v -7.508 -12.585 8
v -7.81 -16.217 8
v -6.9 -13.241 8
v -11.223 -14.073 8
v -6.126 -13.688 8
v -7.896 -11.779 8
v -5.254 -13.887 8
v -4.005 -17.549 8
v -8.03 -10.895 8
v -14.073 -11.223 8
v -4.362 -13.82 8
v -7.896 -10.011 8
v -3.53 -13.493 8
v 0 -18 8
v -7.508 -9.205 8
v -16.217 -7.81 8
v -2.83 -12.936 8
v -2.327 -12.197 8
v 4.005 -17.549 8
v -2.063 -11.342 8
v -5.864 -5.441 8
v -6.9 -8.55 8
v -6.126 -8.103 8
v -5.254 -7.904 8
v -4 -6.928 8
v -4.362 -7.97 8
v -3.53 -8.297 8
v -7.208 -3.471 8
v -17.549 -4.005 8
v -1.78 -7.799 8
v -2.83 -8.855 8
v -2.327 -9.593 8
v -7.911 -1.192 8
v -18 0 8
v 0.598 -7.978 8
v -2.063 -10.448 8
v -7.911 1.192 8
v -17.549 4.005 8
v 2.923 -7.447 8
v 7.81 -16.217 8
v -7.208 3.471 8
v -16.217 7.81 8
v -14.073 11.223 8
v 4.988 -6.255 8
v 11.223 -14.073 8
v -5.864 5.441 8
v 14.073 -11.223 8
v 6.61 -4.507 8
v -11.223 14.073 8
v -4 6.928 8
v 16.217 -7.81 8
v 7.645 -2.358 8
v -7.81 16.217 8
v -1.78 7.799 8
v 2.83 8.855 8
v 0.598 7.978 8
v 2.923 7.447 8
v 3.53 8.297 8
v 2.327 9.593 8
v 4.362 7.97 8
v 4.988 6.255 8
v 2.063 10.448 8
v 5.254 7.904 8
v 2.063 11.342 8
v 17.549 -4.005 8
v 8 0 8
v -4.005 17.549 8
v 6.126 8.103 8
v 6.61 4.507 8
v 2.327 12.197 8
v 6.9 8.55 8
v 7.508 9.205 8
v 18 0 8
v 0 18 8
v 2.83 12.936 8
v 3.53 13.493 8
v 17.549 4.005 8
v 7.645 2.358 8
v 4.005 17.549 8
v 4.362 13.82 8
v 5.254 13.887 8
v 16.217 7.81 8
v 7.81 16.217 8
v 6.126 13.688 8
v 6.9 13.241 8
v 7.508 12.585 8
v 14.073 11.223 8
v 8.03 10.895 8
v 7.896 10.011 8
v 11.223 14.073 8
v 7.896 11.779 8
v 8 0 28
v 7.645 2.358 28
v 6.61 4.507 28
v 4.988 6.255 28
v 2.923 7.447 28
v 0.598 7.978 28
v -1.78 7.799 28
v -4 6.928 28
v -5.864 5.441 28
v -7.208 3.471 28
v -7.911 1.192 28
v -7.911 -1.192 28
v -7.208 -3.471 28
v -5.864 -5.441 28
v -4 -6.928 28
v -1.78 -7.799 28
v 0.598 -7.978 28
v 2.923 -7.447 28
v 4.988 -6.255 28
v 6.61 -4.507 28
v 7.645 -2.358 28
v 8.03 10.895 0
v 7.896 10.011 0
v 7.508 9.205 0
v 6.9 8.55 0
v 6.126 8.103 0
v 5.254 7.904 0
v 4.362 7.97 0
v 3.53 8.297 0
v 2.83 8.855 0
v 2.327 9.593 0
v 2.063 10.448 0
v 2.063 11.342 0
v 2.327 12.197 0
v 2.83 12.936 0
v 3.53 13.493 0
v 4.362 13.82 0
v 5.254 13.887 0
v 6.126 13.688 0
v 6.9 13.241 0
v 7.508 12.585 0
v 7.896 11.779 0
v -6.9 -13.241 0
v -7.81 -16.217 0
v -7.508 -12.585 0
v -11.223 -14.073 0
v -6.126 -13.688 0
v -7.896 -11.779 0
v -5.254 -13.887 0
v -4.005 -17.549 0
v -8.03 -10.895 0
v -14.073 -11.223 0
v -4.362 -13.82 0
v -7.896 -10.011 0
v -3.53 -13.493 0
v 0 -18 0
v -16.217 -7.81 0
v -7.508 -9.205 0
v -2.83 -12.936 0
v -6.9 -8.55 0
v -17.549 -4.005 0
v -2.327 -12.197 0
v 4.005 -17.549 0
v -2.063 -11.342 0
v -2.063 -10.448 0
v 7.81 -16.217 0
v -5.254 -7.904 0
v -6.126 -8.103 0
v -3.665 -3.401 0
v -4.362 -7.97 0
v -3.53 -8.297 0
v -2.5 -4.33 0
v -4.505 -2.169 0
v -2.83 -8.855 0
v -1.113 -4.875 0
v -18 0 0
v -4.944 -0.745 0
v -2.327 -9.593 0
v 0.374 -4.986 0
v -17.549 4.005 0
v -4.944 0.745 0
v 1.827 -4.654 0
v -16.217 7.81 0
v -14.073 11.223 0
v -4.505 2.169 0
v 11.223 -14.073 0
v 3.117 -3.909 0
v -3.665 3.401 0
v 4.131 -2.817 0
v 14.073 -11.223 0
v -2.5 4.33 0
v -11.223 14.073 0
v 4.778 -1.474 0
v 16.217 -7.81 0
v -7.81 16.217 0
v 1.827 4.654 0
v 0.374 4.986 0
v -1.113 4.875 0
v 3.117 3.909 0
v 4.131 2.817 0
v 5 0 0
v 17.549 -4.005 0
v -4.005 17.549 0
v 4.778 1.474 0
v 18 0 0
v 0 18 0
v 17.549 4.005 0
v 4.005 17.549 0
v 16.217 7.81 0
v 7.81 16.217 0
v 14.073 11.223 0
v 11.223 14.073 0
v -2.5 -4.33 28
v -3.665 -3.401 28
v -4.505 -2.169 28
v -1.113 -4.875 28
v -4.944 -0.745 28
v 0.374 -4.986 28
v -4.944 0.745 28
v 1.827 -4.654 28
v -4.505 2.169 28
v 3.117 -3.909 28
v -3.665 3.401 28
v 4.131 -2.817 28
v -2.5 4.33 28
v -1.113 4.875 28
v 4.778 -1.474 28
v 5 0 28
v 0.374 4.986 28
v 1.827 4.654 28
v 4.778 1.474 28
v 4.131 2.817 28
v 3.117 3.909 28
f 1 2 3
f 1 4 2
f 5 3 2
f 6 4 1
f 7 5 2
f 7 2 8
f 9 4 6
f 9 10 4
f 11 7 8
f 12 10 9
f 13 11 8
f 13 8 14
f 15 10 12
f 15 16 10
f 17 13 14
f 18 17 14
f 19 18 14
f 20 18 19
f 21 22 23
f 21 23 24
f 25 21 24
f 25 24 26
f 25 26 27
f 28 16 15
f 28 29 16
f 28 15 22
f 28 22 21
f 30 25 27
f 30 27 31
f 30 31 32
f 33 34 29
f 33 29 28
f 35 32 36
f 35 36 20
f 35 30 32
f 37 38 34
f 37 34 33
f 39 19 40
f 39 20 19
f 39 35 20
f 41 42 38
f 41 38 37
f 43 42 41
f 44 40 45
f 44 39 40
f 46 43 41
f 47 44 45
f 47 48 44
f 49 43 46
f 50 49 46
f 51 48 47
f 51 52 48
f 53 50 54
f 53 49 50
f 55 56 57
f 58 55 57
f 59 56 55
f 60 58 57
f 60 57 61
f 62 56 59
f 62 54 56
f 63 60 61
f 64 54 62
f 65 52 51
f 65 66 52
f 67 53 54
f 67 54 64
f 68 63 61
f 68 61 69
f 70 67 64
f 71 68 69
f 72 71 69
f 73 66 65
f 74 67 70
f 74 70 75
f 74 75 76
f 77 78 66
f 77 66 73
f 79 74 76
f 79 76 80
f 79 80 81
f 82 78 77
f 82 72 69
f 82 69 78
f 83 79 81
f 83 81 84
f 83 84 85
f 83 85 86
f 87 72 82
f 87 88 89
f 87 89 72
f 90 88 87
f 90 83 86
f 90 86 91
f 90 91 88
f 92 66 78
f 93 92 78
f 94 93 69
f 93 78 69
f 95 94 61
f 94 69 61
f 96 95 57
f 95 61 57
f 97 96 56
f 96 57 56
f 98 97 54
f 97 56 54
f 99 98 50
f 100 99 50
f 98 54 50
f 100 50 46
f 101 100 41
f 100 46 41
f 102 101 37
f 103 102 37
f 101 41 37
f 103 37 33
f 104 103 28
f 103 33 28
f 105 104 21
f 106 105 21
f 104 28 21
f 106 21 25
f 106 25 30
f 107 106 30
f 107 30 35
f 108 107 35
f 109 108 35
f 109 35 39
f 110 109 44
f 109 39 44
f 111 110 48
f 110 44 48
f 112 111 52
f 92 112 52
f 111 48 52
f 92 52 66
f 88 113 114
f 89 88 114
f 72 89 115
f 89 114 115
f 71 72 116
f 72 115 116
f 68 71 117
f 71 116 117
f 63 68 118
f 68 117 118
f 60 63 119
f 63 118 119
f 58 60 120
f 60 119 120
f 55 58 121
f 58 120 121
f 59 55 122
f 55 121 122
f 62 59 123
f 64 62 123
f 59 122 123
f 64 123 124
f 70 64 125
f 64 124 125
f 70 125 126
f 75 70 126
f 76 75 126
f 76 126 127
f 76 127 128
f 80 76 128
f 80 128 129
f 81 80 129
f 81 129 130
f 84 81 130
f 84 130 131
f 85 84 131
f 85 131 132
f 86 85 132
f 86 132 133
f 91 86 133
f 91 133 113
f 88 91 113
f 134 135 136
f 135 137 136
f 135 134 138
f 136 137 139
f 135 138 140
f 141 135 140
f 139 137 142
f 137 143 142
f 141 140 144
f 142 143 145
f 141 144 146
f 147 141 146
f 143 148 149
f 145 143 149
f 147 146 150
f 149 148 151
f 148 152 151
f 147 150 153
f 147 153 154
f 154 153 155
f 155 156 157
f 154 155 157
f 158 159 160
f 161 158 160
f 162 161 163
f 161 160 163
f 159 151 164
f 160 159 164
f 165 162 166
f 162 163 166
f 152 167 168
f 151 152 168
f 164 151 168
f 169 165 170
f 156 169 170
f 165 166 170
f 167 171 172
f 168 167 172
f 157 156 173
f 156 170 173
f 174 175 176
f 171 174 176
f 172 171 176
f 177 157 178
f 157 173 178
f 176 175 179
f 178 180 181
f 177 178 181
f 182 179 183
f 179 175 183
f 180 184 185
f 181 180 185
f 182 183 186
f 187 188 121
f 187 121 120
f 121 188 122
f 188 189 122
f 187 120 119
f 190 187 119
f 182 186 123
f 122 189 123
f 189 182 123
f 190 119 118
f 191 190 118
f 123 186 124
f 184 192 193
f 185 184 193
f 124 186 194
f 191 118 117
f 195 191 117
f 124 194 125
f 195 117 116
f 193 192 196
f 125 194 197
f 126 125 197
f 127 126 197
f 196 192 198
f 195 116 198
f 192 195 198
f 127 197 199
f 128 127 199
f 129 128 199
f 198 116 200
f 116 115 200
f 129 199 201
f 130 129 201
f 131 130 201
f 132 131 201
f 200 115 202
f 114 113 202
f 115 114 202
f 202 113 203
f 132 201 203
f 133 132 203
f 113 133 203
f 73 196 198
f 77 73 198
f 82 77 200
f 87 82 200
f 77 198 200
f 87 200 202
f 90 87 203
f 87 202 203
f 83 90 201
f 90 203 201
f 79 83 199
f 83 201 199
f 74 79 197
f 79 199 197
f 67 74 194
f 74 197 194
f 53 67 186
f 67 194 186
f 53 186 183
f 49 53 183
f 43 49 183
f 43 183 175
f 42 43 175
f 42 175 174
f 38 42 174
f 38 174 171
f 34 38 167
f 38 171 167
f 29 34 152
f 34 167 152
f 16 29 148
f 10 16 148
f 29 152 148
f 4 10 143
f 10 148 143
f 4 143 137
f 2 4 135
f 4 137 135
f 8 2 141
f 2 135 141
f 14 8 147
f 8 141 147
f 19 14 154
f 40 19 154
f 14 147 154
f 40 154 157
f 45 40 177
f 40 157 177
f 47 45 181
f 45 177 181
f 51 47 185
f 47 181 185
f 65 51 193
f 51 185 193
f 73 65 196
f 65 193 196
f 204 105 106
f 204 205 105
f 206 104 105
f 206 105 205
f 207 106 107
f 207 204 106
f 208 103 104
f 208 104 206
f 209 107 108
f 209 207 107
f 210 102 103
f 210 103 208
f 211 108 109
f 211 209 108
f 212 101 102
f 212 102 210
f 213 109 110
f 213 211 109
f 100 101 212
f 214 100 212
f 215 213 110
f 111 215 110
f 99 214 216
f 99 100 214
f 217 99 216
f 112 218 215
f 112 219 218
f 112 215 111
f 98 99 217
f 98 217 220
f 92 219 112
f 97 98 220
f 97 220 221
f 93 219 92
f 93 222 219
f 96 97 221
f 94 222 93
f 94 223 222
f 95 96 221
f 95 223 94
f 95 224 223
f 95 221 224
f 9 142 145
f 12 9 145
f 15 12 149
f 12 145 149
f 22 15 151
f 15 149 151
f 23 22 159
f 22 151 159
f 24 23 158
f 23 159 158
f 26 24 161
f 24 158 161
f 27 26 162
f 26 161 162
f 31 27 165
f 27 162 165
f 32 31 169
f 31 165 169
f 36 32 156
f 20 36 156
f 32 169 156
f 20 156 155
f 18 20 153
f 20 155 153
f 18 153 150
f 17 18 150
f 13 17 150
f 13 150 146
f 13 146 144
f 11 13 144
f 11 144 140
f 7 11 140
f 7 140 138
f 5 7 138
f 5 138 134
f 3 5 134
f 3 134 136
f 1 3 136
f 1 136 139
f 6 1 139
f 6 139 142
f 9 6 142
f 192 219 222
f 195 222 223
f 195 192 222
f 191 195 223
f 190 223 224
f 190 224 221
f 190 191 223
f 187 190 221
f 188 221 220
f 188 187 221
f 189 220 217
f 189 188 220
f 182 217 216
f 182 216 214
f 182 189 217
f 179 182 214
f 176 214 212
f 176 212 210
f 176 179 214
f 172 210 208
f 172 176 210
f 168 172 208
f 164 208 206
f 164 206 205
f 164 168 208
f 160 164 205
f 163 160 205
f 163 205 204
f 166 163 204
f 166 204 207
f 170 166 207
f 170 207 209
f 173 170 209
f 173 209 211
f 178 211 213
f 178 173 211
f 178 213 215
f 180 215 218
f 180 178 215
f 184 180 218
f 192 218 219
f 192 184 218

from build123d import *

# Parameters (mm, degrees)
SKETCH_1_R               = 18
SKETCH_1_R_2             = 5
EXTRUDE_1_DEPTH          = 8
SKETCH_2_R               = 8
SKETCH_2_R_2             = 5
EXTRUDE_2_DEPTH          = 20
SKETCH_3_R               = 3
CUT_EXTRUDE_1_DEPTH      = 20
PATTERN_CIRCULAR_1_COUNT = 2


with BuildPart() as part:
    # Эскиз1 → Бобышка-Вытянуть1 (new body)
    with BuildSketch(Plane.XY):
        Circle(SKETCH_1_R)
        Circle(SKETCH_1_R_2, mode=Mode.SUBTRACT)
    extrude(amount=EXTRUDE_1_DEPTH)

    # Эскиз2 → Бобышка-Вытянуть2 (add)
    with BuildSketch(Plane.XY.offset(8)):
        Circle(SKETCH_2_R)
        Circle(SKETCH_2_R_2, mode=Mode.SUBTRACT)
    extrude(amount=EXTRUDE_2_DEPTH)

    # Эскиз3 → Вырез-Вытянуть1 (cut)
    with BuildSketch(Plane(origin=(0, 0, 0), x_dir=(-1, 0, 0), z_dir=(0, 0, -1))):
        with Locations((5.029540605, -10.89512374)):
            Circle(SKETCH_3_R)
    cut_extrude_1 = extrude(amount=-CUT_EXTRUDE_1_DEPTH, mode=Mode.SUBTRACT)

    # Круговой массив1: Вырез-Вытянуть1 ×2 about axis
    pattern_circular_1_axis = Axis((0, 0, 0), (0, 0, 1))
    for i in range(1, PATTERN_CIRCULAR_1_COUNT):
        add(cut_extrude_1.rotate(pattern_circular_1_axis, i * 360 / PATTERN_CIRCULAR_1_COUNT), mode=Mode.SUBTRACT)


solid = part.part
